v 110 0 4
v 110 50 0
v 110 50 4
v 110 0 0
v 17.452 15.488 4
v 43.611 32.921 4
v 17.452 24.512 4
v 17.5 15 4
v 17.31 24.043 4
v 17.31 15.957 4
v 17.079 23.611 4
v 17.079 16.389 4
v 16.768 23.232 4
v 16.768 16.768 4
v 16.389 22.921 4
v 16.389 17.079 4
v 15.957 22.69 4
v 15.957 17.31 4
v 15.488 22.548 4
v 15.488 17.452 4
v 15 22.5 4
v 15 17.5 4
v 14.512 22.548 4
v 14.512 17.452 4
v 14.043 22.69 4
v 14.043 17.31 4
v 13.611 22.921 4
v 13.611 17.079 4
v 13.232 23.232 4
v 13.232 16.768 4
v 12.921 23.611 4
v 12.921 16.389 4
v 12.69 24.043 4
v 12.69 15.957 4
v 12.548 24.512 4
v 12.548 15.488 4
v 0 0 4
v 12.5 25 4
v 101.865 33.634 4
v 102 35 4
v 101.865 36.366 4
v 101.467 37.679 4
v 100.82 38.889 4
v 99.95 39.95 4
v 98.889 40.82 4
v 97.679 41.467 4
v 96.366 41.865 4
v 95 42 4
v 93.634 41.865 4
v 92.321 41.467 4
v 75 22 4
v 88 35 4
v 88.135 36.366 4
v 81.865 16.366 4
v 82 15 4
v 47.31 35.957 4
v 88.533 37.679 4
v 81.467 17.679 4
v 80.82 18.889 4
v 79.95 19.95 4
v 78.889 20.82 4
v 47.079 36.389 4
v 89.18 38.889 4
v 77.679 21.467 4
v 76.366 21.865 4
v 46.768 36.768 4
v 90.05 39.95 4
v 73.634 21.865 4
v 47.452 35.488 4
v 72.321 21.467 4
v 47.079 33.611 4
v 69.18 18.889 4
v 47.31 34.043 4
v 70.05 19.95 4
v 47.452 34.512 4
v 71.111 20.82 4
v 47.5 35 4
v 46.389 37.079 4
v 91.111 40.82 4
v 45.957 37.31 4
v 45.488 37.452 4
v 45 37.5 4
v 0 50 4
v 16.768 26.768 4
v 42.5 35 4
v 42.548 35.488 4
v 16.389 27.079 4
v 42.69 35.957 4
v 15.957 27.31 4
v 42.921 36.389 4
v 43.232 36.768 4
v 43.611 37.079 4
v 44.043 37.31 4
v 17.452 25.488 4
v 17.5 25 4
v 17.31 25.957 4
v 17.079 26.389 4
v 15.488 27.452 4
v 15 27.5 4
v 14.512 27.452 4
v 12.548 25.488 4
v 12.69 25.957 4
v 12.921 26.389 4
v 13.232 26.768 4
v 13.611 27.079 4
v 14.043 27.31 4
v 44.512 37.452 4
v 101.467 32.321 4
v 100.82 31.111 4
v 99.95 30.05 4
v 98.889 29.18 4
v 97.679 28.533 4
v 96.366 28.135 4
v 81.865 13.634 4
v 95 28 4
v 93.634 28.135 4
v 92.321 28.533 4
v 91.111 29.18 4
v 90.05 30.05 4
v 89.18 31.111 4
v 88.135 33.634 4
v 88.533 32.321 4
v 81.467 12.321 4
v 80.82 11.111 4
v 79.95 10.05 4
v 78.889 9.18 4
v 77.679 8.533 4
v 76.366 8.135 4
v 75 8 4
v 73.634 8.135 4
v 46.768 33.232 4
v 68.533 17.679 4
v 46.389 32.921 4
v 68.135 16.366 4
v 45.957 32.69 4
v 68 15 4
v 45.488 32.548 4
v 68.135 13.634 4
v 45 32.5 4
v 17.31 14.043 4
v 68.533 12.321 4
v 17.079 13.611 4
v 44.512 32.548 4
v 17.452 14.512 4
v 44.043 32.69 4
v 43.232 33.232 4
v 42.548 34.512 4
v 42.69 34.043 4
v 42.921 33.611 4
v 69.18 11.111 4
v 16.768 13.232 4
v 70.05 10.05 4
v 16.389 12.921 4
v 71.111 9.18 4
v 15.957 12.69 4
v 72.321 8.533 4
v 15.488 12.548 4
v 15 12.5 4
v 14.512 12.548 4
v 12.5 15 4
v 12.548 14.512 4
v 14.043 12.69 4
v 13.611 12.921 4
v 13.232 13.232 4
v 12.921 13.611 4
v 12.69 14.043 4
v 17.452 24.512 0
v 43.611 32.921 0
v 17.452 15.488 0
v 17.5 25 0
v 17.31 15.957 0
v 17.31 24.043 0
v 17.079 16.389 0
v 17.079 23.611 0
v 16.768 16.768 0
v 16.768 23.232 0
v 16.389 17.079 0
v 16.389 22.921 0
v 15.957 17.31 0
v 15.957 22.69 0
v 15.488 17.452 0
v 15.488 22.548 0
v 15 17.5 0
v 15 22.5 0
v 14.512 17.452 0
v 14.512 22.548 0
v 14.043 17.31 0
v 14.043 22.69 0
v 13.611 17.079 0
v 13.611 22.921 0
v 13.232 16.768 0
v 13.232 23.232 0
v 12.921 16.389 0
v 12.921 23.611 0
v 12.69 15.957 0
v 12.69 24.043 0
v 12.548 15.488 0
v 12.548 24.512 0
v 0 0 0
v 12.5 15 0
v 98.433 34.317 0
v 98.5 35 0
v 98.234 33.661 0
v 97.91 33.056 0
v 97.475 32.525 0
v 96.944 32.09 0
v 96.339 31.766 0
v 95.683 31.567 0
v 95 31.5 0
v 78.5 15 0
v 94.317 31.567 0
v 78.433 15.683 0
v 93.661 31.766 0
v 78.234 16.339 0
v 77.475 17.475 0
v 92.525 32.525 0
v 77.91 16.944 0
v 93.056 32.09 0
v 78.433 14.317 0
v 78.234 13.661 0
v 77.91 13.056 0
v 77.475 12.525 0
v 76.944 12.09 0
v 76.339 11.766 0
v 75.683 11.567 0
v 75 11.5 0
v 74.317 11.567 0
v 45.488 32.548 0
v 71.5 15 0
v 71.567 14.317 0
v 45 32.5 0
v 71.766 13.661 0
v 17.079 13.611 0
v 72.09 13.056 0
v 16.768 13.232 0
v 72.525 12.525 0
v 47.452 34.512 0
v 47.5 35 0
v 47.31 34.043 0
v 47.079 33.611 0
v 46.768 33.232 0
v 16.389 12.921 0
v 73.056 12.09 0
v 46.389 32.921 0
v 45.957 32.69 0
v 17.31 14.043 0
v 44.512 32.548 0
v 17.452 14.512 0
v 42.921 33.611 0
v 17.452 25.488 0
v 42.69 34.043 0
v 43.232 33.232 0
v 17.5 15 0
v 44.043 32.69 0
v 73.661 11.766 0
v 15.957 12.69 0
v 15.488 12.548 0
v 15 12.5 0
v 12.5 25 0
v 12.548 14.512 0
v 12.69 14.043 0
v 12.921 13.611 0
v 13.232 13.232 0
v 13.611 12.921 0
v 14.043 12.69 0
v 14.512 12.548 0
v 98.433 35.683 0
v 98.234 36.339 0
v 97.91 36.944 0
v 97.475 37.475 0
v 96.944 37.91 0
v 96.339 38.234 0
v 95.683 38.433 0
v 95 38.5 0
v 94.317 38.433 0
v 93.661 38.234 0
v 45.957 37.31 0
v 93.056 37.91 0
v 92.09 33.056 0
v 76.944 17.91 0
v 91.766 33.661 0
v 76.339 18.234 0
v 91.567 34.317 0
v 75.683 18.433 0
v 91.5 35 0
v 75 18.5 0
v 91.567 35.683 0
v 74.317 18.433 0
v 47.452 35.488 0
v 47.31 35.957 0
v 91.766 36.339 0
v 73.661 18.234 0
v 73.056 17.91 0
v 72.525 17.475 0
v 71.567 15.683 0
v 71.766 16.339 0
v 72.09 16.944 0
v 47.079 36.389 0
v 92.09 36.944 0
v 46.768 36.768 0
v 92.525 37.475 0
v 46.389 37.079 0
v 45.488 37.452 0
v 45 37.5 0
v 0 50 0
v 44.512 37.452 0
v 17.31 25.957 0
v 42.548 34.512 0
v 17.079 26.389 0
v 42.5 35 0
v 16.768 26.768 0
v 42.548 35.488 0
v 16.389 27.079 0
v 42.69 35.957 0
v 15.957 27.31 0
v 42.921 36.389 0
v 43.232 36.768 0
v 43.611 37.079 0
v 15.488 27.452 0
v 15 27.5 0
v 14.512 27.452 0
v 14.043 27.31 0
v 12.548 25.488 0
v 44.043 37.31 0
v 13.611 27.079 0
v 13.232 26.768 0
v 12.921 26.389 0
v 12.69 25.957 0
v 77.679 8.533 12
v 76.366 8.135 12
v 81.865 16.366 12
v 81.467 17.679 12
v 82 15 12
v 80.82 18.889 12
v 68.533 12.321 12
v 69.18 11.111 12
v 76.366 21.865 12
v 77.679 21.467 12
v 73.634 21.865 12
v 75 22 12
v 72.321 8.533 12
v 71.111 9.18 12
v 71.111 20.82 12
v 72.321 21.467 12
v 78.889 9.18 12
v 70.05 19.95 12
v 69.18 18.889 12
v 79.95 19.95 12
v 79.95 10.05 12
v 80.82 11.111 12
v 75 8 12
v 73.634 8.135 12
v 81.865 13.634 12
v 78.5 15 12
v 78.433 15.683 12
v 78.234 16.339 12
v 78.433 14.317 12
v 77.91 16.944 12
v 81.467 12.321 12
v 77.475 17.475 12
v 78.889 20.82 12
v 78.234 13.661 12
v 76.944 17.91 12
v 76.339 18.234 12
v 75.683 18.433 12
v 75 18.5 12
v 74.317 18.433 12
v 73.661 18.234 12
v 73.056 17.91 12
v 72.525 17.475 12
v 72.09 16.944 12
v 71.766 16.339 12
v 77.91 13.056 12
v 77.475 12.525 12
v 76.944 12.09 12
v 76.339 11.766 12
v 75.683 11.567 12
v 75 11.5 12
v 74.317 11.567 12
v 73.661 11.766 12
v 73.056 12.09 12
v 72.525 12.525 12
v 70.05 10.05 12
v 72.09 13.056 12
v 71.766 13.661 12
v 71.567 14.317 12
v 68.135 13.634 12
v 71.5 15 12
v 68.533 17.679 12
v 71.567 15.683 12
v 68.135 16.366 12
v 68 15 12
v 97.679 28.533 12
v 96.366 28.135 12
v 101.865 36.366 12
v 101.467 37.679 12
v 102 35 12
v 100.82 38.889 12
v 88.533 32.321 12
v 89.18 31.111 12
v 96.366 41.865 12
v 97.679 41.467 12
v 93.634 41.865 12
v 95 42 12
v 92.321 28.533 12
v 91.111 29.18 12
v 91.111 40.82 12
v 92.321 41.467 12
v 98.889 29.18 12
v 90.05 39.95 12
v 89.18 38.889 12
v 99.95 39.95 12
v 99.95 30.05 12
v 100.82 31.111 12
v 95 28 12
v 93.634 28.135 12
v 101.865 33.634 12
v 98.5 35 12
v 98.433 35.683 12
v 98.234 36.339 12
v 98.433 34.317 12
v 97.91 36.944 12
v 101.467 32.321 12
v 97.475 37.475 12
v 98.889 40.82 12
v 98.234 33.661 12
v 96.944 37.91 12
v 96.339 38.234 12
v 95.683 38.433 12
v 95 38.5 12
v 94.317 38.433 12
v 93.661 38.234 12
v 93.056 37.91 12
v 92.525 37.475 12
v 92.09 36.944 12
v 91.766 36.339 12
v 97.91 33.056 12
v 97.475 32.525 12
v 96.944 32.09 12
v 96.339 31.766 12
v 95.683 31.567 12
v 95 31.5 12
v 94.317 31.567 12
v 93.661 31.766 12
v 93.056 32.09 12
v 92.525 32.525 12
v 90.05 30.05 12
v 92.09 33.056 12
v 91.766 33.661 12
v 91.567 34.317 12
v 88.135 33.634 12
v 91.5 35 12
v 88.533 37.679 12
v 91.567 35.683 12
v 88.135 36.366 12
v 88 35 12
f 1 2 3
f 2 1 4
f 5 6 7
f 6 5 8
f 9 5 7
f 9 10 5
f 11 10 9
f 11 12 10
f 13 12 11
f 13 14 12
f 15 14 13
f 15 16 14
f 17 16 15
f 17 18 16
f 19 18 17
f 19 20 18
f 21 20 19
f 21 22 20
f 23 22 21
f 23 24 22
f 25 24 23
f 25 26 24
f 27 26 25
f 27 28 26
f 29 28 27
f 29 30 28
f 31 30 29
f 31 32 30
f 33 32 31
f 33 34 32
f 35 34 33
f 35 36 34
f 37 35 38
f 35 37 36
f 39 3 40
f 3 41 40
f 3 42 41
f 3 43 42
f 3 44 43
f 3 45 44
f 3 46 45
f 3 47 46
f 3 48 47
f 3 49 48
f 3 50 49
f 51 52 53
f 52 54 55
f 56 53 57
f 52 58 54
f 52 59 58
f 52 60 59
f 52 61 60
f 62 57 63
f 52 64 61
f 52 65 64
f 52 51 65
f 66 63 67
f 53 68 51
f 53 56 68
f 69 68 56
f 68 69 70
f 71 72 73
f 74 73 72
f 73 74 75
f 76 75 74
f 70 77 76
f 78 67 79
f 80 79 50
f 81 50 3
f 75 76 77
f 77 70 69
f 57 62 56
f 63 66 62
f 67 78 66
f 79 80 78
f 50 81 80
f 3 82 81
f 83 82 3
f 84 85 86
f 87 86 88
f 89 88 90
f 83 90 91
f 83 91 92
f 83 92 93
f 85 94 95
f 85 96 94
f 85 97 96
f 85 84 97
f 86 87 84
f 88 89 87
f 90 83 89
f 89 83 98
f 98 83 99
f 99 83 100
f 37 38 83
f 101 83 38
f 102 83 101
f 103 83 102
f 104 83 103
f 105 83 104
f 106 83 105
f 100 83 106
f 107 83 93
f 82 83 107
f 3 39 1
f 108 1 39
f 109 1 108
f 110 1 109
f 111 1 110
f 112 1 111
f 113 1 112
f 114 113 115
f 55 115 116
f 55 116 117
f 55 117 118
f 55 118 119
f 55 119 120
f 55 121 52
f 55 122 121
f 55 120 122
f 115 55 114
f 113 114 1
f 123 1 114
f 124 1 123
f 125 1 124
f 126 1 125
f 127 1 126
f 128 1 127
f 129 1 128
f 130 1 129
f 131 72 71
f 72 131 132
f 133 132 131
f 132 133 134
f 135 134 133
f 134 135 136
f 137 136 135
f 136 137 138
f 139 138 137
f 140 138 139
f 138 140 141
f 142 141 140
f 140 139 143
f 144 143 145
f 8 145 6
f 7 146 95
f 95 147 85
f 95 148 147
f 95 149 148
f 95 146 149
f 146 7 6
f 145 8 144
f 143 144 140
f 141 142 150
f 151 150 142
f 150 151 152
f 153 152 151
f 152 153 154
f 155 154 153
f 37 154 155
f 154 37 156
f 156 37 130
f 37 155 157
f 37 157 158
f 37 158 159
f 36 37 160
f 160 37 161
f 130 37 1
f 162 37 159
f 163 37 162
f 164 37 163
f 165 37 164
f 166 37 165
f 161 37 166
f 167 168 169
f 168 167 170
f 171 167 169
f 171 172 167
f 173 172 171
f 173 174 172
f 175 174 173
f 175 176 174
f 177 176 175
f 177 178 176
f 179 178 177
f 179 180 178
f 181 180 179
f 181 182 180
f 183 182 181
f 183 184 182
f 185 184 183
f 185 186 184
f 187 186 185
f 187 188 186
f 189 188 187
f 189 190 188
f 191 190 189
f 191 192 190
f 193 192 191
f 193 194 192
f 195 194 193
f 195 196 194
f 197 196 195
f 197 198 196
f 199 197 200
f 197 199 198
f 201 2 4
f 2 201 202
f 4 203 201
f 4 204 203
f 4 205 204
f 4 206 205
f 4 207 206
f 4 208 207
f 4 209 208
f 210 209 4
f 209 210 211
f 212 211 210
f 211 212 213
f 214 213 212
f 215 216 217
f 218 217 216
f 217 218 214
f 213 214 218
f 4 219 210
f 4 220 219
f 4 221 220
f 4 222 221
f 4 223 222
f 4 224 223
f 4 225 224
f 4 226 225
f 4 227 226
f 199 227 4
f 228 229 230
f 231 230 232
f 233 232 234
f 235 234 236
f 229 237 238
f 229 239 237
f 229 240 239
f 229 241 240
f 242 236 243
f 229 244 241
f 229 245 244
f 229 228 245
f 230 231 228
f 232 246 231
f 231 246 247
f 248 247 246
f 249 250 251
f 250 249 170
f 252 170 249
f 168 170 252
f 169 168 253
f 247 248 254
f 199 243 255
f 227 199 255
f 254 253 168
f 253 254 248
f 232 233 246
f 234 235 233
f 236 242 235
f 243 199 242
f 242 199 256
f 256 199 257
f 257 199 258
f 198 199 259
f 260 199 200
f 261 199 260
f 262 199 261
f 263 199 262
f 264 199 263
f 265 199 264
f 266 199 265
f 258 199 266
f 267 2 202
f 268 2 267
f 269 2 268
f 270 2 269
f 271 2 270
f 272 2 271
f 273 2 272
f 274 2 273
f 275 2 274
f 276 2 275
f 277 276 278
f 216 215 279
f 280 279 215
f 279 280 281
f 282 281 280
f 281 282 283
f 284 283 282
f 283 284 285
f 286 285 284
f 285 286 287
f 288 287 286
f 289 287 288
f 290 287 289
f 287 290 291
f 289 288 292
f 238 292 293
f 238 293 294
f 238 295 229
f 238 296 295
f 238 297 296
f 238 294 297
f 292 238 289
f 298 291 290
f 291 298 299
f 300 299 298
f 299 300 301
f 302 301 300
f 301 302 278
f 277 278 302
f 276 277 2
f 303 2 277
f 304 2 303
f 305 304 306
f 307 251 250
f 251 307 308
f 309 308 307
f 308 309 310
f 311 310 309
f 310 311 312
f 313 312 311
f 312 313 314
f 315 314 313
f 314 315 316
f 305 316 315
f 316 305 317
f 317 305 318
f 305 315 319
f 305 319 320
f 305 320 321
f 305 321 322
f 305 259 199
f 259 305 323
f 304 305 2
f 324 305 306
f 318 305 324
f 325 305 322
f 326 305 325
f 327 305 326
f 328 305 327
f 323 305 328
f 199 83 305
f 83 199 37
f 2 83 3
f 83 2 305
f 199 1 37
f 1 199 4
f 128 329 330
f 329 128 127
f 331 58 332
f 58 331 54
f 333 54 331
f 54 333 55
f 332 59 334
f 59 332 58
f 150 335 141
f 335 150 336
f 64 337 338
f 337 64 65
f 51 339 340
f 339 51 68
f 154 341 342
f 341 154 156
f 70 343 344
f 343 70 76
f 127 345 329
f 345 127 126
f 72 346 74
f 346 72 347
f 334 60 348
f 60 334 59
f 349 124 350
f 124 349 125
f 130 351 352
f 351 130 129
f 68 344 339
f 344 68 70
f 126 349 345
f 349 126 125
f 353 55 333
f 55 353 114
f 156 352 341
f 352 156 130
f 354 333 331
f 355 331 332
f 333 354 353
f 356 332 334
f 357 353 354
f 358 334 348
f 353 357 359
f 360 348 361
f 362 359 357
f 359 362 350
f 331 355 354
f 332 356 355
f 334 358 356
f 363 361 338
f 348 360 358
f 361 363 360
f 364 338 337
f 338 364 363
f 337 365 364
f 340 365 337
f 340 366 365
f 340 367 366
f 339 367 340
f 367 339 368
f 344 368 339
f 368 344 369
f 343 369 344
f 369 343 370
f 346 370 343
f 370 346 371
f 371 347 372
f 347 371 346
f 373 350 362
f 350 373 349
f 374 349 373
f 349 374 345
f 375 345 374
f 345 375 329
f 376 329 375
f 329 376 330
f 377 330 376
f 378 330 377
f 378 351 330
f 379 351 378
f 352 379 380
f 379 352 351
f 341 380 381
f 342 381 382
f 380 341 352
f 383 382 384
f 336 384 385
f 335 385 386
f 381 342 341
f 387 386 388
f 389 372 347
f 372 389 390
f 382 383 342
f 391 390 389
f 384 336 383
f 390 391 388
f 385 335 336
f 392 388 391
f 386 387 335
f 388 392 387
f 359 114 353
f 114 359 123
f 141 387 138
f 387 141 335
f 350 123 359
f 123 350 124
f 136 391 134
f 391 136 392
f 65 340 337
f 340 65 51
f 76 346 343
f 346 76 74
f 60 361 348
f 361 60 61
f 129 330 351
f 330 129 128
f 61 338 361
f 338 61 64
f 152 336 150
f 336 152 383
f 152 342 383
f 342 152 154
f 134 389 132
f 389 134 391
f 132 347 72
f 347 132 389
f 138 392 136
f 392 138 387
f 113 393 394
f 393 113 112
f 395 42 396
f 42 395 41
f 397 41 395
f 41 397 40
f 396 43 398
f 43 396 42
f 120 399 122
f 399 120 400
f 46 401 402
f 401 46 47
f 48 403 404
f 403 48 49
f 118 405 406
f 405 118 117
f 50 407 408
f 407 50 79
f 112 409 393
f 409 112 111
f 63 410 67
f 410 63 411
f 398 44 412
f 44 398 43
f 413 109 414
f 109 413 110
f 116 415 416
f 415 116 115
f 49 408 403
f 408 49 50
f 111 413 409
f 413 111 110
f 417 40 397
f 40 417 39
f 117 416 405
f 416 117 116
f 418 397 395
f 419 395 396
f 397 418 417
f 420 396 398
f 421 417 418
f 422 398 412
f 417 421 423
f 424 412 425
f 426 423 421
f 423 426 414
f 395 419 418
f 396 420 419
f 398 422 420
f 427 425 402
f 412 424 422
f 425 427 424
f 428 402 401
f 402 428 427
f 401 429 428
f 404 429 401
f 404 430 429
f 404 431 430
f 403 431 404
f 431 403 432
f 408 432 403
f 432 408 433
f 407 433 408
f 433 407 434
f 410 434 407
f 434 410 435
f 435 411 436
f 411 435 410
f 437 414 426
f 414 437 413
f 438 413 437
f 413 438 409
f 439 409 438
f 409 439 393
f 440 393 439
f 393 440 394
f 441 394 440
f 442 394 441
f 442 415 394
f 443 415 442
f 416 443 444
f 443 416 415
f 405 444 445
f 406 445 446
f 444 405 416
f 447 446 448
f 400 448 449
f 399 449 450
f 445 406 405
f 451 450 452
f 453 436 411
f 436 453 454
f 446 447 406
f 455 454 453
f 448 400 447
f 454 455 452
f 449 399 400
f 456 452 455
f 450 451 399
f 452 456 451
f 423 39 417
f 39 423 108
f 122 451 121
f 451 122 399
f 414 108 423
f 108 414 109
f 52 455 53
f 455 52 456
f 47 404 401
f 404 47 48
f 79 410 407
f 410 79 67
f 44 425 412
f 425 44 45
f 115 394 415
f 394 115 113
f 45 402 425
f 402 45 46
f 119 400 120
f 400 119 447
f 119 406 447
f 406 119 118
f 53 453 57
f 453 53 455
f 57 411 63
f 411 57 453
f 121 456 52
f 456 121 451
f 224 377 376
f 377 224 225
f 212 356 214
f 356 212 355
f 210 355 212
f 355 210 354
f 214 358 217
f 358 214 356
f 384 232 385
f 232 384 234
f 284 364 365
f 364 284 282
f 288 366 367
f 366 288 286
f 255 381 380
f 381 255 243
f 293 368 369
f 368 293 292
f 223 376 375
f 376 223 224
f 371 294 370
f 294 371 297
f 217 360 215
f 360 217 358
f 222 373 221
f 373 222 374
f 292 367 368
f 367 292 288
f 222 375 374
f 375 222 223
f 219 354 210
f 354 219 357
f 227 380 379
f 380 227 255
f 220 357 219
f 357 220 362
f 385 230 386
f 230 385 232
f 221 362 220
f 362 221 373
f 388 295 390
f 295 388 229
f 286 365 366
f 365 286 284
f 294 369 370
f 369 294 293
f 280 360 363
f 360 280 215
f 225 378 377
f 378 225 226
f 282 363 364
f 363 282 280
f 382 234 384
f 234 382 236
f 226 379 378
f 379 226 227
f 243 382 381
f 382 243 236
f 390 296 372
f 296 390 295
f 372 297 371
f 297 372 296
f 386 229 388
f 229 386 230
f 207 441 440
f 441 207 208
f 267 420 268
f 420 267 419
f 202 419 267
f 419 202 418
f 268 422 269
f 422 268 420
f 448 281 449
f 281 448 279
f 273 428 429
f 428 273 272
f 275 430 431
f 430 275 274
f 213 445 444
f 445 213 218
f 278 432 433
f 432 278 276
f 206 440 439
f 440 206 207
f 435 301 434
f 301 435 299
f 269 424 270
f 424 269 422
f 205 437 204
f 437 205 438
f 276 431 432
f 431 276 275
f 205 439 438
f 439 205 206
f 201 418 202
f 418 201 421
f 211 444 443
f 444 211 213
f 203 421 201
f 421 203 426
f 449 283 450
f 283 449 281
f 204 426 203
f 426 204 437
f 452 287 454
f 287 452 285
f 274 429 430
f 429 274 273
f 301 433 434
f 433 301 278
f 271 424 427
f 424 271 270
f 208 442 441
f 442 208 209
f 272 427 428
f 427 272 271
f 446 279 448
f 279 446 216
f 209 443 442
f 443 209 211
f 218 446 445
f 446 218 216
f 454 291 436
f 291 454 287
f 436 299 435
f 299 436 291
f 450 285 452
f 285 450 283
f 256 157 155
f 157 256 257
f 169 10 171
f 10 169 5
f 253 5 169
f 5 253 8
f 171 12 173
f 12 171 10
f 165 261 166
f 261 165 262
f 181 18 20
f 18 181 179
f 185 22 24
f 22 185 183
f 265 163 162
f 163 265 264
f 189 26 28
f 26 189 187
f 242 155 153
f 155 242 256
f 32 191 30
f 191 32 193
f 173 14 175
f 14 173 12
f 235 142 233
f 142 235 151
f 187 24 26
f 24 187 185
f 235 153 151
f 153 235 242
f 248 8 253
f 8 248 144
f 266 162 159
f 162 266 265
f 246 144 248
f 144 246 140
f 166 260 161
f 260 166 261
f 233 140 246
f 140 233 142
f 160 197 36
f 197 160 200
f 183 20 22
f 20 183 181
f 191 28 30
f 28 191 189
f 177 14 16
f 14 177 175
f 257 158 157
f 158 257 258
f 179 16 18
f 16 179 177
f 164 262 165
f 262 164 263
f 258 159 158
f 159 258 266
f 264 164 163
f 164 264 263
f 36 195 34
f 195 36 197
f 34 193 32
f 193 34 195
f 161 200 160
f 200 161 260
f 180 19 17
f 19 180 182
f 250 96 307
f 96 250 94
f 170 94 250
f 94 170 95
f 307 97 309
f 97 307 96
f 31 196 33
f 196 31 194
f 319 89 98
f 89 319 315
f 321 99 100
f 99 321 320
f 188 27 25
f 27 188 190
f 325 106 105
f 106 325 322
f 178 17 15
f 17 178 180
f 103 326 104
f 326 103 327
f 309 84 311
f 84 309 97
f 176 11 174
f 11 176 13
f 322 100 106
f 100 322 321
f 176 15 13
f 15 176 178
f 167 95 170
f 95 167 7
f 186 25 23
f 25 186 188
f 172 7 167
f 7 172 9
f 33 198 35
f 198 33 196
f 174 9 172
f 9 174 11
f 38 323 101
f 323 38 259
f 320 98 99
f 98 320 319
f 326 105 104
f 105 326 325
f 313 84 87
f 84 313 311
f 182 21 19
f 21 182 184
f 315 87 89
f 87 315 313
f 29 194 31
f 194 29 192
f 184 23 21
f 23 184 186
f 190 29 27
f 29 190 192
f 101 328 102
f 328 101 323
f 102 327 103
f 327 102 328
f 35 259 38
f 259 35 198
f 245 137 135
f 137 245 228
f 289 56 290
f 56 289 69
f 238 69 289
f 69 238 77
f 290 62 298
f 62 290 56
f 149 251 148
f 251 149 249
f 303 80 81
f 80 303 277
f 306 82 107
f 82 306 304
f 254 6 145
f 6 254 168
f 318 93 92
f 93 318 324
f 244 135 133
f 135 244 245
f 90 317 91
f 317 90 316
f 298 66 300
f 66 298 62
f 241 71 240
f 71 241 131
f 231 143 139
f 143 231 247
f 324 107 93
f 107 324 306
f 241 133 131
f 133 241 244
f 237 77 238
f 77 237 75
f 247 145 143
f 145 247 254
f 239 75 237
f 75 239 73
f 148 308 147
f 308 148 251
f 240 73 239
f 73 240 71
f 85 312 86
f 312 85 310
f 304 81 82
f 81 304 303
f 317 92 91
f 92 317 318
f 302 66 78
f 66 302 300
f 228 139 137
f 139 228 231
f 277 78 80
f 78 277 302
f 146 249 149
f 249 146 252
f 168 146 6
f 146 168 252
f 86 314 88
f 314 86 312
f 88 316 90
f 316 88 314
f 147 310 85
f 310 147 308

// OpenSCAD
$fn = 32;

// ----------------------------------------------------------------------
// Mixed field: bosses and holes at given coordinates
// ----------------------------------------------------------------------

// --- parameters (mm) ---
plate_l = 110;            // plate length, X
plate_w = 50;             // plate width, Y
plate_t = 4;              // plate thickness, Z
boss_d = 14;              // boss diameter
boss_h = 8;               // boss height above the plate
hole_d = 5;               // through hole diameter

total_h = plate_t + boss_h;  // overall height

difference() {
  union() {
    cube([plate_l, plate_w, plate_t]);
    translate([75, 15, plate_t]) cylinder(h = boss_h, d = boss_d);
    translate([95, 35, plate_t]) cylinder(h = boss_h, d = boss_d);
  }
  translate([75, 15, -1]) cylinder(h = total_h + 2, d = boss_d / 2);
  translate([95, 35, -1]) cylinder(h = total_h + 2, d = boss_d / 2);
  translate([15, 15, -1]) cylinder(h = plate_t + 2, d = hole_d);
  translate([15, 25, -1]) cylinder(h = plate_t + 2, d = hole_d);
  translate([45, 35, -1]) cylinder(h = plate_t + 2, d = hole_d);
}
